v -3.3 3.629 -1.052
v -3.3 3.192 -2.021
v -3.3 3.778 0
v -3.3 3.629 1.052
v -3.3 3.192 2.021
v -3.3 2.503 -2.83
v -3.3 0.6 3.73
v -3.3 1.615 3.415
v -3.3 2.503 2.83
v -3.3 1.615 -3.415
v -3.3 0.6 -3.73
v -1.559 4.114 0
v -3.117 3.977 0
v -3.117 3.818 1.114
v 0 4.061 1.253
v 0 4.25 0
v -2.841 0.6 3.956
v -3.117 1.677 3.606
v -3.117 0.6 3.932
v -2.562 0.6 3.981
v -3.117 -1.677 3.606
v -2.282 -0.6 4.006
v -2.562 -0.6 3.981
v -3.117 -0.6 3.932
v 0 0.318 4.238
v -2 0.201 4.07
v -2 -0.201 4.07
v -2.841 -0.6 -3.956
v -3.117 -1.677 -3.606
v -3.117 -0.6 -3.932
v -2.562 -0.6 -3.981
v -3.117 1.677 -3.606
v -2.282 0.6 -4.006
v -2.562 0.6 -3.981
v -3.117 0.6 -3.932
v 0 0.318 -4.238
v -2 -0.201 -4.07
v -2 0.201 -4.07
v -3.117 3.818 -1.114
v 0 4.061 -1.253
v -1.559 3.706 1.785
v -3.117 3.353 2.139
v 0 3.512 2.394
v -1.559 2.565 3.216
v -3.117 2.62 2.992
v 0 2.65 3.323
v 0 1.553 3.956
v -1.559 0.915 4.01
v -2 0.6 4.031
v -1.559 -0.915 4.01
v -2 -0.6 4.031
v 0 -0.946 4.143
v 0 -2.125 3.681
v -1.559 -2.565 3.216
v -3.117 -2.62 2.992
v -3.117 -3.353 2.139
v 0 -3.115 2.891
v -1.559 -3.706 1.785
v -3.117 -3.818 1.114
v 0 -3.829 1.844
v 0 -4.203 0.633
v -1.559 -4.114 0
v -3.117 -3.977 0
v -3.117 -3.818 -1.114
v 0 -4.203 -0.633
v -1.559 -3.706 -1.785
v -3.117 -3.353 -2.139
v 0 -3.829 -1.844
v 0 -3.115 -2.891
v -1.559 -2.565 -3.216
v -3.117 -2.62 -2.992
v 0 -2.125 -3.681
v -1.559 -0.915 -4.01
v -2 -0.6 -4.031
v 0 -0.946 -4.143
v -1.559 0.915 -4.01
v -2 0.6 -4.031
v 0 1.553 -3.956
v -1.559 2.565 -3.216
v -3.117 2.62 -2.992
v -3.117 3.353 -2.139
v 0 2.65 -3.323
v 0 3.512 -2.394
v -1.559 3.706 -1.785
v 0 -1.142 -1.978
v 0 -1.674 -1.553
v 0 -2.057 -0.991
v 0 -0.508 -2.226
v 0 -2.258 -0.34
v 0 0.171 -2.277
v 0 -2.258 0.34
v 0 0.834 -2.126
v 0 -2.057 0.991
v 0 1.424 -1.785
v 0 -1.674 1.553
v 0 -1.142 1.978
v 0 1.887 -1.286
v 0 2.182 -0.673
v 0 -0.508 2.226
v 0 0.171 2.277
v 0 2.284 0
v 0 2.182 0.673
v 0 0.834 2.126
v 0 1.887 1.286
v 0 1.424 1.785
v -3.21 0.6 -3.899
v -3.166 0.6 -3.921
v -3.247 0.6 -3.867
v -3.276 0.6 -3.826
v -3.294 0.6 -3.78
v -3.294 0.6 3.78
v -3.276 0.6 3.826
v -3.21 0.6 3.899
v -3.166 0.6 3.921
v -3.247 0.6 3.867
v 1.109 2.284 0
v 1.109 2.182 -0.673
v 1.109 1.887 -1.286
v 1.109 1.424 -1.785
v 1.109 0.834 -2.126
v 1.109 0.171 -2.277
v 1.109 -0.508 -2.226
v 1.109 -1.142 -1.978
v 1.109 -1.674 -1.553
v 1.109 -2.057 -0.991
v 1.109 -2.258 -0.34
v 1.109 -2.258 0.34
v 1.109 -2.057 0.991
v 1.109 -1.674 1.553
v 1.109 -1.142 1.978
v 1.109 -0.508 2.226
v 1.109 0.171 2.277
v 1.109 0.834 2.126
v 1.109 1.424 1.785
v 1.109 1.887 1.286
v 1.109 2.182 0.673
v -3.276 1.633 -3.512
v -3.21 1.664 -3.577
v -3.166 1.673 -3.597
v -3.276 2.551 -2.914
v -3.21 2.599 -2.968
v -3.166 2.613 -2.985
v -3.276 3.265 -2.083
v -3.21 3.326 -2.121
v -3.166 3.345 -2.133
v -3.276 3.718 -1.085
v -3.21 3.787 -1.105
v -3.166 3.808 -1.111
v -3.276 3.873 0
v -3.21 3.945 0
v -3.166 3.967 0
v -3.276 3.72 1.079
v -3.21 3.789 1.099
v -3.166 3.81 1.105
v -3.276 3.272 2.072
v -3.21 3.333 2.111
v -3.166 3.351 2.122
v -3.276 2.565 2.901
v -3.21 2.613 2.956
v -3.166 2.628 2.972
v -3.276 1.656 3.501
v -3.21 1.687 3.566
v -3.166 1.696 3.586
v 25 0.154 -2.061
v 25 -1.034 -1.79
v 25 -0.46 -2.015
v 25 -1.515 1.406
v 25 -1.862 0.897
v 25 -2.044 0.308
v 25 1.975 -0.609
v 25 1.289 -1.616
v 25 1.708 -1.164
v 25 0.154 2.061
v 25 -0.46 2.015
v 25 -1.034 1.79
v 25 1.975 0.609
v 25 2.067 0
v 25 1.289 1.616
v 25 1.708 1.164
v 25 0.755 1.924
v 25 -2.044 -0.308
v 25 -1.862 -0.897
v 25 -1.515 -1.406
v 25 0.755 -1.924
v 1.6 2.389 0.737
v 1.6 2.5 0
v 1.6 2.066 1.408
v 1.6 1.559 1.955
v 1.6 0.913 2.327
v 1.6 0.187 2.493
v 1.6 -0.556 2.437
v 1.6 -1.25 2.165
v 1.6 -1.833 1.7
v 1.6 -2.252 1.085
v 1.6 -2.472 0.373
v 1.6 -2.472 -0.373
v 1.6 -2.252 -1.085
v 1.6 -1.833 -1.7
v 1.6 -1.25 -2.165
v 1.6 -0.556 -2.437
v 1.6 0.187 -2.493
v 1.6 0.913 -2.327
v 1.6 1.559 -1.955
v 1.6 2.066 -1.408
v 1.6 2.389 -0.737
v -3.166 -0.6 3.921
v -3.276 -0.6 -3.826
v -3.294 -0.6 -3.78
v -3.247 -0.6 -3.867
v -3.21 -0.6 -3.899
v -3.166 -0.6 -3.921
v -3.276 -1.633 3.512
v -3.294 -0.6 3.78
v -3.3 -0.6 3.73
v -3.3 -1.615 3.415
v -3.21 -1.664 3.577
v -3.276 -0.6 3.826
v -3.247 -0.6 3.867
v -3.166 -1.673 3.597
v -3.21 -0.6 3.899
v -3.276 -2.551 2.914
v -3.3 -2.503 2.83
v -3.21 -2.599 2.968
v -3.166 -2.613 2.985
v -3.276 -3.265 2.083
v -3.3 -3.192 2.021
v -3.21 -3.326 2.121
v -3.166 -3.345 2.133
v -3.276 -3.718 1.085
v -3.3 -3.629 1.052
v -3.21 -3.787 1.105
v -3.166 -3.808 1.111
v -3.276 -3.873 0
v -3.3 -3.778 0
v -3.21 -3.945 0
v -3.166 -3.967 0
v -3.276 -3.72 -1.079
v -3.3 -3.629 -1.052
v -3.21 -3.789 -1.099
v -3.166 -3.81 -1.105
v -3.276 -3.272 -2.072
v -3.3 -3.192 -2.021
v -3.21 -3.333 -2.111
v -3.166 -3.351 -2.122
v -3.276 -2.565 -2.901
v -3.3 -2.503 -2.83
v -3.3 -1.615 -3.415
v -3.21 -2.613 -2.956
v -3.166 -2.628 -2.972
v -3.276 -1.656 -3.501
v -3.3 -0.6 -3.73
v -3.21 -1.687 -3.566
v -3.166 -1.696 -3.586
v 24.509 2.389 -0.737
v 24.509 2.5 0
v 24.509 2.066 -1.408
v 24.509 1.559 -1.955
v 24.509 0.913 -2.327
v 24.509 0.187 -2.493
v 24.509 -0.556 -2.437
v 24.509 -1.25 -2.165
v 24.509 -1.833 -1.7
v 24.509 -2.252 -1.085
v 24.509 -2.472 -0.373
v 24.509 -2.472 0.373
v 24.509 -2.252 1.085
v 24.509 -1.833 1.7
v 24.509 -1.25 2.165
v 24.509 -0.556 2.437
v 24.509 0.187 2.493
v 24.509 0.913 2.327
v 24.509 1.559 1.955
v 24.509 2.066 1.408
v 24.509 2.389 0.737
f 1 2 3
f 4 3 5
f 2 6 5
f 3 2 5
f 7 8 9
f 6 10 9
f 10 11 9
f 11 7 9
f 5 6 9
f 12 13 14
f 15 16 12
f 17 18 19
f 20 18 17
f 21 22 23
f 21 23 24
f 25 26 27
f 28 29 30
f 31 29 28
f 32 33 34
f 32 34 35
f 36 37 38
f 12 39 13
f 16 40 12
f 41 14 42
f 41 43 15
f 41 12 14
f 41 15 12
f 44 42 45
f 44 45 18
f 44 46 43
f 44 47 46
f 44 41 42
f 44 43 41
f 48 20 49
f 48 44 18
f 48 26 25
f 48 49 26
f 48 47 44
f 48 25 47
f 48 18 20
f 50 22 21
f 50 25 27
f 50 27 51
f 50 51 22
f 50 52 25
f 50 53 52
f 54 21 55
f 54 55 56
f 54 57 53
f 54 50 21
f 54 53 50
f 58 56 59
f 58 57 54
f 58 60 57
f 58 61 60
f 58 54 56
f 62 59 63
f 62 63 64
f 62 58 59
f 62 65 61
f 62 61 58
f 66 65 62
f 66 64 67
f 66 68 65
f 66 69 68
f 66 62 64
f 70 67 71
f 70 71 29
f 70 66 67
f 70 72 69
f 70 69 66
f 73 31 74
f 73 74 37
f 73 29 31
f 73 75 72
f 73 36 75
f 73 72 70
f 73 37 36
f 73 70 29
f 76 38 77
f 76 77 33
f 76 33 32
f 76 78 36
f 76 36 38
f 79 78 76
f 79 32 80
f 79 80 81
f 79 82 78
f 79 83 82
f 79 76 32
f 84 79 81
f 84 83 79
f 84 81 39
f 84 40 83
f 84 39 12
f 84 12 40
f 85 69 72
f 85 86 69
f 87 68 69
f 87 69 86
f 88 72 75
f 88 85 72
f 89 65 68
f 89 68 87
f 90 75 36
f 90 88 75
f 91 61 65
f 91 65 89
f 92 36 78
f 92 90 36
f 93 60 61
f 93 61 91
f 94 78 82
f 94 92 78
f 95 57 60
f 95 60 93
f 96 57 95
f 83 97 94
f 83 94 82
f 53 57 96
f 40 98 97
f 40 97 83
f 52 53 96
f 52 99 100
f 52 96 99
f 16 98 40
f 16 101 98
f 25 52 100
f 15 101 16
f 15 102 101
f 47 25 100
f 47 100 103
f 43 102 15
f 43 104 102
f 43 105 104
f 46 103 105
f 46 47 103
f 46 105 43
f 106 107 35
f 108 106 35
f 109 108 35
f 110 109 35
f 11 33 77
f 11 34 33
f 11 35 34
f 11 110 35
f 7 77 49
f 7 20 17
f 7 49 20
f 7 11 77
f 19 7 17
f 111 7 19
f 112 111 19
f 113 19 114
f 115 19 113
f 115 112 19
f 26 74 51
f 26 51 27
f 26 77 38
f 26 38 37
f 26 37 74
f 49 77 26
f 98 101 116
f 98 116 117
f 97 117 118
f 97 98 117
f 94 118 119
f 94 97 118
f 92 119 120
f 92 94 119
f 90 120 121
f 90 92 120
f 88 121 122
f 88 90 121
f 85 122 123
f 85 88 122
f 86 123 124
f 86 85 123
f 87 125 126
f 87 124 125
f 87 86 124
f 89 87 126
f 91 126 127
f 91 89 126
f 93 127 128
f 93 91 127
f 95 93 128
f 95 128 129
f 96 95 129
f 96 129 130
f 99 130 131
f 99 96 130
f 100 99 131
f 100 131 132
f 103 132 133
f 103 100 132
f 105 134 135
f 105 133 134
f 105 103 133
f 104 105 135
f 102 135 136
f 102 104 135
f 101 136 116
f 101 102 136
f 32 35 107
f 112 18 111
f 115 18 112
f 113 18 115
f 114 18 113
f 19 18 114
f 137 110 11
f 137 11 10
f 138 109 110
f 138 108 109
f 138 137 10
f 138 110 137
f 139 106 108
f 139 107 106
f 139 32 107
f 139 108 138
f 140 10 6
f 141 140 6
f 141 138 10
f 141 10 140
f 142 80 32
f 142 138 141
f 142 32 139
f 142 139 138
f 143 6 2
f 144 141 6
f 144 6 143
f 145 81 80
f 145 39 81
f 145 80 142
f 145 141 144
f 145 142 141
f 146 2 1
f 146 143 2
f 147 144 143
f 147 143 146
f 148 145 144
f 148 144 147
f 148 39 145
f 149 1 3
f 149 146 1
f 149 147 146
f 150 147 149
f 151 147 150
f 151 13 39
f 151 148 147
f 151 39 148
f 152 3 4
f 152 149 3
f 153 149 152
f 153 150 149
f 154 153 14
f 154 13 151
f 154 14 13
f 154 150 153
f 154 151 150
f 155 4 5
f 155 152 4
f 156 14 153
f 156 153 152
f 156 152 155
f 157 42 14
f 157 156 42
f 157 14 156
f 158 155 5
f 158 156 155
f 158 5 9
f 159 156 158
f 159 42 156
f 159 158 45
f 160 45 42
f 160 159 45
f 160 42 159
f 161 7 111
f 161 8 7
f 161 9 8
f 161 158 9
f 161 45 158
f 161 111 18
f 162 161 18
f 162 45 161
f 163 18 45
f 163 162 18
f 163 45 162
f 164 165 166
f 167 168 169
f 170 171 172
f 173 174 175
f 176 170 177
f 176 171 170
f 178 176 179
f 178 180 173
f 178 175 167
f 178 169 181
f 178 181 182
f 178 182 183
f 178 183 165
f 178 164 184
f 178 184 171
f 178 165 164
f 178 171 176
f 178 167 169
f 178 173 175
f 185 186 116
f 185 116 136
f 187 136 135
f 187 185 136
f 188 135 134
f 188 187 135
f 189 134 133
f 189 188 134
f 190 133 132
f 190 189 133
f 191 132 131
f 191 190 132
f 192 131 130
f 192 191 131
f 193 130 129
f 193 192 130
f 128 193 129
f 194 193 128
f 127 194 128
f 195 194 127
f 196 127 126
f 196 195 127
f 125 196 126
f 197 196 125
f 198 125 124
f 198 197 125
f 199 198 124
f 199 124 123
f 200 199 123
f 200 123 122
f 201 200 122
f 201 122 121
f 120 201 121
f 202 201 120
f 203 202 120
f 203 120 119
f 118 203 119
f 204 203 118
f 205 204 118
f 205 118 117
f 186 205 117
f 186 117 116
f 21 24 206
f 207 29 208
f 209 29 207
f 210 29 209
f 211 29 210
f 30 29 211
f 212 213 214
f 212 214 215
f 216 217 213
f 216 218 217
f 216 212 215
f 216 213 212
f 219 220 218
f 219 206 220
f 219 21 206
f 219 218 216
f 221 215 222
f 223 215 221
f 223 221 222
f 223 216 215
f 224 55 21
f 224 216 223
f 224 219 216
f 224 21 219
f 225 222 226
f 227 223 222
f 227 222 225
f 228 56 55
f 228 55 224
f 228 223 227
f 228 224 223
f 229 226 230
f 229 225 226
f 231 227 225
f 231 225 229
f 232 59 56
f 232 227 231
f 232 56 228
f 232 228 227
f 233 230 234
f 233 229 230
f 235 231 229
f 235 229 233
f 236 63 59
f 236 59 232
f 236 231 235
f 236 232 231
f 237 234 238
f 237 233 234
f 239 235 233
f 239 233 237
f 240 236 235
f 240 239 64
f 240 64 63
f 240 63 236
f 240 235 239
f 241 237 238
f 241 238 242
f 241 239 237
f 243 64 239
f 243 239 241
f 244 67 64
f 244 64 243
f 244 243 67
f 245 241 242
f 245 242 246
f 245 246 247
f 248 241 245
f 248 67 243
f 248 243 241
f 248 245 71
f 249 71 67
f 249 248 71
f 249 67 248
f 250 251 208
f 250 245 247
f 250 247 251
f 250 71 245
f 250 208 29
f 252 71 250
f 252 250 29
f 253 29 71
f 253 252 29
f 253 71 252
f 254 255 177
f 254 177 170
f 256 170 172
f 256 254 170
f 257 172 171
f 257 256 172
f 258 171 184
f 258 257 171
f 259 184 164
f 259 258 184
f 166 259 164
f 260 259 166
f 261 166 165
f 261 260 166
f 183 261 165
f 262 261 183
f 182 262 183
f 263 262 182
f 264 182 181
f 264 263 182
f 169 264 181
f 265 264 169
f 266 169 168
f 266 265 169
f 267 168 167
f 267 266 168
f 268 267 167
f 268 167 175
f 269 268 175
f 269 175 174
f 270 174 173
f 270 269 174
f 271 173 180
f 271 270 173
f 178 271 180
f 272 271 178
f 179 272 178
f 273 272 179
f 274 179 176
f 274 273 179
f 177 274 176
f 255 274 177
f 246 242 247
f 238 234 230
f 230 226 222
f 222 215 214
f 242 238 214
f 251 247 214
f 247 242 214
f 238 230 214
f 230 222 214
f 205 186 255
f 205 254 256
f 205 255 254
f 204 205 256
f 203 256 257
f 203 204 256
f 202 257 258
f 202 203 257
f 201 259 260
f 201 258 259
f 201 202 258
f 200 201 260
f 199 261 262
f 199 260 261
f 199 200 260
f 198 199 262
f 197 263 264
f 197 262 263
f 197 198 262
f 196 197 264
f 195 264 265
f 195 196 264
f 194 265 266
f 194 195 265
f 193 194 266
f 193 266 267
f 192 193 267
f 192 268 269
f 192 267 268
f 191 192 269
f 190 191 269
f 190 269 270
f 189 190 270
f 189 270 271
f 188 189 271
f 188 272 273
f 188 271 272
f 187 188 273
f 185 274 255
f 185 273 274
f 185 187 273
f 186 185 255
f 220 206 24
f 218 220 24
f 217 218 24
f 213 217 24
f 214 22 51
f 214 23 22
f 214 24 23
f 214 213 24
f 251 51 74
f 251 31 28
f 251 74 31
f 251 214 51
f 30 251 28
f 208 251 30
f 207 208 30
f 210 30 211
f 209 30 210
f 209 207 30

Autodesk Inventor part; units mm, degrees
ref_plane "YZ Plane" through (0, 0, 0) normal (1, 0, 0) x (0, 1, 0)
ref_plane "XZ Plane" through (0, 0, 0) normal (0, 1, 0) x (-1, 0, 0)
sketch "Sketch1" plane through (0, 0, 0) normal (0, 0, 1) x (1, 0, 0)
  line L0 (-3.3, 0) -> (25, 0)
  line L1 (25, 0) -> (25, 2.5)
  line L2 (25, 2.5) -> (1.6, 2.5)
  line L3 (1.6, 2.5) -> (1.1091, 2.2835)
  line L4 (1.1091, 2.2835) -> (0, 2.2835)
  line L5 (0, 2.2835) -> (0, 4.25)
  line L6 (-8.96, 0) -> (30.66, 0) projected
  line L7 (0, -0.85) -> (0, 5.1) projected
  line L8 (-3.3, 0) -> (-3.3, 3.9613)
  line L9 (0, 4.25) -> (-3.3, 3.9613)
  line L10 (1.6, 2.5) -> (0, 2.5) construction
  dimension "d0" = 25
  dimension "d1" = 23.4
  dimension "d2" = 0.4909
  dimension "d3" = 3.3
  dimension "d4" = 5
  dimension "d5" = 4.567
  dimension "d9" = 8.5
  dimension "d10" = 5
revolve "Body" add sketch "Sketch1" angle 360 about axis through (-3.3, 0, 0) along (1, 0, 0)
sketch "Sketch2" plane through (-3.3, 0, 0) normal (-1, 0, 0) x (0, 0, 1)
  circle A0 centre (0, 0) radius 4.25 projected
  line L0 (0, 0) -> (0, 3.9613) projected
  line L1 (-4.25, 0.6) -> (4.25, 0.6)
  line L2 (4.25, 0.6) -> (4.25, -0.6)
  line L3 (4.25, -0.6) -> (-4.25, -0.6)
  line L4 (-4.25, -0.6) -> (-4.25, 0.6)
  line L5 (-4.25, 0) -> (4.25, 0) construction
  line L6 (0, 0.6) -> (0, -0.6) construction
  point P0 (0, 0)
  dimension "d11" = 1.2
  dimension "d12" = 8.5
fillet "Fillet1" radius 0.2 1 edges at (-3.3, -3.9613, 0)
extrude "Slot" cut sketch "Sketch2" against normal blind 1.3 contours A0 L3 L1 | L2 L3 A0 | A0 L1 L2 | A0 L4 L1 | L3 L4 A0
thread "Thread" size "M5x0.8" class "6g" standard "ISO Metric profile" length 23.4
chamfer "Chamfer1" distance 0.433 distance2 0.4909 1 edges at (25, -2.5, 0) measured on face at (25, 0.6238, 0.5526)
ref_plane "Work Plane1" through (30.1625, 0, 0) normal (0, 0, -1) x (1, 0, 0)
equation "\"d11\" = SBR"
equation "\"d12\" = KOD"
equation "\"d14\" = RR"
equation "\"d19\" = STI"
equation "\"d15\" = GEL"
equation "\"d17\" = -0.5 * SPD + 0.5 * GD"
equation "\"d0\" = NLG"
equation "\"d1\" = GEL"
equation "\"d3\" = KOH"
equation "\"d4\" = GD"
equation "\"d5\" = BDM"
equation "\"d9\" = KOD"
equation "\"d10\" = KEWI"
equation "\"GD\" = 5"
equation "\"NLG\" = 25"
equation "\"GEL\" = 23.4"
equation "\"KOD\" = 8.5"
equation "\"KOH\" = 3.3"
equation "\"GAL\" = 0.61345 * PTC"
equation "\"SPD\" = 4.13397"
equation "\"BDM\" = 4.56699"
equation "\"GUL\" = 0.61345 * PTC"
equation "\"RR\" = 0.2"
equation "\"SBR\" = 1.2"
equation "\"STI\" = 1.3"
equation "\"KEWI\" = 5deg"
equation "\"PTC\" = 0.8"
equation "\"THREADDIA\" = 5"
equation "\"TOA\" = 30deg"
equation "\"NND\" = 5"
equation "\"GD1\" = THREADDIA - 1.2269 * PTC"
properties part number "DIN 84 - M5 x 25" material "Steel, Mild"
